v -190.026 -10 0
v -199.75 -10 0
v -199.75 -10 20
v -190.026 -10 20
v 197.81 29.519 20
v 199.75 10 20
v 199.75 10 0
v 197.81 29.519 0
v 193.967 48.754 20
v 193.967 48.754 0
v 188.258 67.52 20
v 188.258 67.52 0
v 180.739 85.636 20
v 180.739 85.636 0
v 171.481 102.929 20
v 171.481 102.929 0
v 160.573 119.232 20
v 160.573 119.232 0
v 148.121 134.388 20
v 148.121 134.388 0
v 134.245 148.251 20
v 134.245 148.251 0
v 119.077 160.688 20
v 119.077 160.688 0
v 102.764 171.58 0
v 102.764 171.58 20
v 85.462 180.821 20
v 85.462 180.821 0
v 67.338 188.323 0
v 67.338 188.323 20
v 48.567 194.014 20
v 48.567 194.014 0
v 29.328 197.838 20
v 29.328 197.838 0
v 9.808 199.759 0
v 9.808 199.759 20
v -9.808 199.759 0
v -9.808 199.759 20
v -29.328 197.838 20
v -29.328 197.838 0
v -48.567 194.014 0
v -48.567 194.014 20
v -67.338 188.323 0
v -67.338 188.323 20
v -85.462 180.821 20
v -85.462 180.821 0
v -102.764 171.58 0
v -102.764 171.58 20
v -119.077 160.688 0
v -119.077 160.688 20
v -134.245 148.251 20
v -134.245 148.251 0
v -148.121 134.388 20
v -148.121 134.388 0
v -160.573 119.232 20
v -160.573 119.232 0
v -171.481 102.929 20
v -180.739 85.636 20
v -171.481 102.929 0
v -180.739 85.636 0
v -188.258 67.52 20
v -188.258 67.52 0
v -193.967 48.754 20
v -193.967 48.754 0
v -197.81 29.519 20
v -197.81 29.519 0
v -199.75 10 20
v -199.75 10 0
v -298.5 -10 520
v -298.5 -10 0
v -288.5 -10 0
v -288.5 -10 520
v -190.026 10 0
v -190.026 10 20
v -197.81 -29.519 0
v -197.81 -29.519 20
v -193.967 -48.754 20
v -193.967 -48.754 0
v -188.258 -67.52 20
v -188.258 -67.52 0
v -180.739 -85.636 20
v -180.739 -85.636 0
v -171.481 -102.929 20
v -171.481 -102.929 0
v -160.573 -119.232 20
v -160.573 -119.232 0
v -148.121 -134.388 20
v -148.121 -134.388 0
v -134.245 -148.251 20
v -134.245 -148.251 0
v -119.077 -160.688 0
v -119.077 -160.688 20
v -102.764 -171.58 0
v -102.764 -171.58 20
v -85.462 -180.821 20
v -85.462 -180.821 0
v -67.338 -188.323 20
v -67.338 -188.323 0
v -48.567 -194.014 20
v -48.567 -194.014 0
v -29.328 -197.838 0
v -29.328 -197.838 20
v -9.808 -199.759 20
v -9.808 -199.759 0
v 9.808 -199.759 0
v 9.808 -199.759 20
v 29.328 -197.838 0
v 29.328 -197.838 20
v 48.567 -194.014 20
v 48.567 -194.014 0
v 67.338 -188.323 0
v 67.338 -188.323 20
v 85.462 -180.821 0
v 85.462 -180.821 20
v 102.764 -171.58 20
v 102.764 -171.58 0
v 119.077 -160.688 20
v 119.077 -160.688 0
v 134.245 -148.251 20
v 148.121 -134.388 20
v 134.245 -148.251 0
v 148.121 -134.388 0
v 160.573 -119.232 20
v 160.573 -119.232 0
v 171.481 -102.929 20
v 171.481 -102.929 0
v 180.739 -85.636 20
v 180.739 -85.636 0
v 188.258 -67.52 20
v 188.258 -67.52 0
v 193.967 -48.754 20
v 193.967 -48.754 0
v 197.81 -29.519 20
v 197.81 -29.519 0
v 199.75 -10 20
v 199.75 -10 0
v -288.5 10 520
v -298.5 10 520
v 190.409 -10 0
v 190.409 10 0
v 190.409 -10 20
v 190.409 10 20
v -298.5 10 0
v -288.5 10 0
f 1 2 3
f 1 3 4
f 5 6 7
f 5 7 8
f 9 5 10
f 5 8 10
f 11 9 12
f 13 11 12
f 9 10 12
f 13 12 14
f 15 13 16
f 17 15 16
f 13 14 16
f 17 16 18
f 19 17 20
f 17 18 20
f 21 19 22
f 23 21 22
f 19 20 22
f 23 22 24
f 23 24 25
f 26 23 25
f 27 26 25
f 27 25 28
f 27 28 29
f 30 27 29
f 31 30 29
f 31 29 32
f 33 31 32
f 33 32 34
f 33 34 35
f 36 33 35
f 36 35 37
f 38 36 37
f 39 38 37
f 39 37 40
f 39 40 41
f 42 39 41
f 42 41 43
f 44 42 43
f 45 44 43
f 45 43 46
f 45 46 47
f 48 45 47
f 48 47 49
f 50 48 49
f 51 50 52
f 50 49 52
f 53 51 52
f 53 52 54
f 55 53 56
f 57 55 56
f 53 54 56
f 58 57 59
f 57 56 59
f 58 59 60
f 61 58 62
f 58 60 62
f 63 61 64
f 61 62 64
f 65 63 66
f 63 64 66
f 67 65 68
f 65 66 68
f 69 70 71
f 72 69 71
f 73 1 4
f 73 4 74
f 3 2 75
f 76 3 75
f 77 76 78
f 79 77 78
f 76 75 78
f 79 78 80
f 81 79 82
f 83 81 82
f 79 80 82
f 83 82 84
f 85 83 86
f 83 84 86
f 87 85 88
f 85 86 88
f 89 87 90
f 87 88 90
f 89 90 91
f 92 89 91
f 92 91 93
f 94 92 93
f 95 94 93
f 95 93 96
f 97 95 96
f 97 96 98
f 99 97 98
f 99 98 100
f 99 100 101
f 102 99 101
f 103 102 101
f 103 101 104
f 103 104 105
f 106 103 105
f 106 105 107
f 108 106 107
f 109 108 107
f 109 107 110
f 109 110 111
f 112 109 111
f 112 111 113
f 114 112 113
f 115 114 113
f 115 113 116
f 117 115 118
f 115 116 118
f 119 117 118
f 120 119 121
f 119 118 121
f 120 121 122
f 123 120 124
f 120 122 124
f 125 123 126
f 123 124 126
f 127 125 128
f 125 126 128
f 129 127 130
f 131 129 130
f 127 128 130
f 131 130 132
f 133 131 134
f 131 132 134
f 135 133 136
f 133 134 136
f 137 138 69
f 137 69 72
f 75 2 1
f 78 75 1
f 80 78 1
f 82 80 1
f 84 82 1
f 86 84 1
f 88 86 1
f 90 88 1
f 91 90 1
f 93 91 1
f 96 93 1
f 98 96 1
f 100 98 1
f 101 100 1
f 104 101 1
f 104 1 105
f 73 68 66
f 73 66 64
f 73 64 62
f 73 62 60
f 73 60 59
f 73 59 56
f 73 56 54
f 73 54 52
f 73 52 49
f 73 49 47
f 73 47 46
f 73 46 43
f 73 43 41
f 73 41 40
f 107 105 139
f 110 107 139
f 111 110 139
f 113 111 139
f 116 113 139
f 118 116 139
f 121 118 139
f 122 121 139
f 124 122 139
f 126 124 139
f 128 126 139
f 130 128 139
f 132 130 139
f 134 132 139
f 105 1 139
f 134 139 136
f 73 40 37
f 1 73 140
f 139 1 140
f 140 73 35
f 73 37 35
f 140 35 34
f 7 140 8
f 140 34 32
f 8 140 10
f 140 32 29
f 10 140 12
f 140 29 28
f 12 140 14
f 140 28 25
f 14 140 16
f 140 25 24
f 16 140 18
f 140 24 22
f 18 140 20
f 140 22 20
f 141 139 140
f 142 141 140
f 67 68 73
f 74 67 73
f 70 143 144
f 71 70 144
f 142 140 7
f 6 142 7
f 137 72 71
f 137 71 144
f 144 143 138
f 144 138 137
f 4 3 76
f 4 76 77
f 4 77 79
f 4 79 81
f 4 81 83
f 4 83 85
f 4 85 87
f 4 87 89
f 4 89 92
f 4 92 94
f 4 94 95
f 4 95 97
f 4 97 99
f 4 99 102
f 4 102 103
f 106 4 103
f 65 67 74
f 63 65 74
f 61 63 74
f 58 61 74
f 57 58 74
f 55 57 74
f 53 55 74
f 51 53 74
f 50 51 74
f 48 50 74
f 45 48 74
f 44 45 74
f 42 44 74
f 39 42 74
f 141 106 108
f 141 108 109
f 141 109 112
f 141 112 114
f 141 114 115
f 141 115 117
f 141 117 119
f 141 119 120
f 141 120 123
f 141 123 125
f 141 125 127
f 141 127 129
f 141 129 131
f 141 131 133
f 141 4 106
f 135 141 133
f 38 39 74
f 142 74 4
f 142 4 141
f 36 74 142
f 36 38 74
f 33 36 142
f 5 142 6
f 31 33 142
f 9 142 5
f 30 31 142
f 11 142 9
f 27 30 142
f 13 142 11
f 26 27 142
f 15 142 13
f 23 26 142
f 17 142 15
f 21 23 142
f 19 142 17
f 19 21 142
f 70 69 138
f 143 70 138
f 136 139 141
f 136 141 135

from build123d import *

# Parameters (mm, degrees)
F0_W     = 10
F0_H     = 20
F1_DEPTH = 520
F2_R     = 200
F3_DEPTH = 20
F4_W     = 10
F4_H     = 20
F5_DEPTH = 20
F6_W     = 10
F6_H     = 20
F7_DEPTH = 20


with BuildPart() as f1:
    # F0 (on Top) → F1 (new body)
    with BuildSketch(Plane.XY):
        with Locations((-293.499589, 0)):
            Rectangle(F0_W, F0_H)
    extrude(amount=F1_DEPTH)


with BuildPart() as f3:
    # F2 (on Top) → F3 (new body)
    with BuildSketch(Plane.XY):
        Circle(F2_R)
    extrude(amount=F3_DEPTH)

    # F4 (on Top) → F5 (cut)
    with BuildSketch(Plane.XY):
        with Locations((-195.025742, 0)):
            Rectangle(F4_W, F4_H)
    extrude(amount=F5_DEPTH, mode=Mode.SUBTRACT)

    # F6 (on Top) → F7 (cut)
    with BuildSketch(Plane.XY):
        with Locations((195.408762, 0)):
            Rectangle(F6_W, F6_H)
    extrude(amount=F7_DEPTH, mode=Mode.SUBTRACT)


solid = Compound([f1.part, f3.part])
